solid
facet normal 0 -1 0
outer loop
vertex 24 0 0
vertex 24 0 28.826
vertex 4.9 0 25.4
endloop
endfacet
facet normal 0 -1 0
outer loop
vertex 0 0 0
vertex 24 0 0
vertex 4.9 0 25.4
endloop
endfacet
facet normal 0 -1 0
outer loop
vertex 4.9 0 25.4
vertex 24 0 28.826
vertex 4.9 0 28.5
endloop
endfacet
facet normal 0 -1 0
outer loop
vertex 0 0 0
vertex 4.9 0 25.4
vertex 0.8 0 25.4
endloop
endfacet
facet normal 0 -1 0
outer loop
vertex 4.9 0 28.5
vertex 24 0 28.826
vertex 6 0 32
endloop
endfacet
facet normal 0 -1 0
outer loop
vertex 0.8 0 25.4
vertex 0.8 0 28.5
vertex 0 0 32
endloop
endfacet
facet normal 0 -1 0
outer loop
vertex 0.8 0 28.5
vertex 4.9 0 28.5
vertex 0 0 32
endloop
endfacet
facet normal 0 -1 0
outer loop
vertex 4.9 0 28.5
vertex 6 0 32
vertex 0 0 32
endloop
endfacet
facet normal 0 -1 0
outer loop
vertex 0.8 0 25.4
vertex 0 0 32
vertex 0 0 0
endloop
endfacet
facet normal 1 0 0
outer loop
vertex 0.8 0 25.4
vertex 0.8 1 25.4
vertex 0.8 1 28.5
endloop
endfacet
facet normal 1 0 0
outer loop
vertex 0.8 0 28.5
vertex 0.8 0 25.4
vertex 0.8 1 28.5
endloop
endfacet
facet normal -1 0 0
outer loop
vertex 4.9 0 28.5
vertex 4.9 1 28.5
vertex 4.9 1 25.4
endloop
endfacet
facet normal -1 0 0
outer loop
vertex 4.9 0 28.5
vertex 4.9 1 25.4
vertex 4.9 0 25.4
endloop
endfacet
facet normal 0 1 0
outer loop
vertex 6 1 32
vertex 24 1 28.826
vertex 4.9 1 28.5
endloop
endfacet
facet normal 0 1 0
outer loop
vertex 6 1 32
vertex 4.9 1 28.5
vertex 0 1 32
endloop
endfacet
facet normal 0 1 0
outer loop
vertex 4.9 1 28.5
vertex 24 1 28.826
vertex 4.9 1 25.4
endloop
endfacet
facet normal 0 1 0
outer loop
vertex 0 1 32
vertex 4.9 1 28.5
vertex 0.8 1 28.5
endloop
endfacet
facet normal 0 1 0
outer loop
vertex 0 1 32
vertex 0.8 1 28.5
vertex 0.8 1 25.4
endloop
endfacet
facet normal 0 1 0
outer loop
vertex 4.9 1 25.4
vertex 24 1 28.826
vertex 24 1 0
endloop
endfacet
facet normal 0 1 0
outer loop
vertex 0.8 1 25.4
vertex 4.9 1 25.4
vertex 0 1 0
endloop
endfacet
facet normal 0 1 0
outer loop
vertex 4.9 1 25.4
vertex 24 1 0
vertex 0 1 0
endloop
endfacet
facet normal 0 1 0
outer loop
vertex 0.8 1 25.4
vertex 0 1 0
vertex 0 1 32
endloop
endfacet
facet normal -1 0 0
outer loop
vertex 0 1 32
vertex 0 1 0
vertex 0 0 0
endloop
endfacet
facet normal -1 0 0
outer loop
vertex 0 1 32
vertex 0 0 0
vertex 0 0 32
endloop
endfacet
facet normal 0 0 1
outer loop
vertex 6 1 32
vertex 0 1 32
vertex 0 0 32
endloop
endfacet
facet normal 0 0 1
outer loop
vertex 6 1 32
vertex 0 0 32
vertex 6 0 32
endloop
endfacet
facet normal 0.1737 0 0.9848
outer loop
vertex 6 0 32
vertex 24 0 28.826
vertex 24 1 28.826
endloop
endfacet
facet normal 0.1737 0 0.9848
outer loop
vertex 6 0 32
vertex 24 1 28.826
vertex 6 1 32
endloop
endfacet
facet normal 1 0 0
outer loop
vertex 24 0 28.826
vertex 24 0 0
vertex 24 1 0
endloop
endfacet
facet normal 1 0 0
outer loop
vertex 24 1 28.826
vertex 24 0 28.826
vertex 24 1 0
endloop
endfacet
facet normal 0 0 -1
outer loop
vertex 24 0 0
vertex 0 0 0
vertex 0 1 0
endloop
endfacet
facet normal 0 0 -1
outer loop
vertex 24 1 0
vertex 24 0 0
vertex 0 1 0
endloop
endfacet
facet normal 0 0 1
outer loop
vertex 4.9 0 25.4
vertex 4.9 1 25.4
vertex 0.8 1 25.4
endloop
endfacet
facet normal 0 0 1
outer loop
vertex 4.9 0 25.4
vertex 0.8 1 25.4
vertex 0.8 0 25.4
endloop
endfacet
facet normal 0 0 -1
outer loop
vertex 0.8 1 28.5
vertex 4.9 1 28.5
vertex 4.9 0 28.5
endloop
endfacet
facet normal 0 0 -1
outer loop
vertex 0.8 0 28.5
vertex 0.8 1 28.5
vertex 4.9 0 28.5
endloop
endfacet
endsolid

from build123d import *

# Parameters (mm, degrees)
SKETCH_3_W          = 2.5
SKETCH_3_H          = 24
EXTRUDE_1_DEPTH     = 33
FILLET_1_R          = 1
CUT_EXTRUDE_1_DEPTH = 41.880924647
SKETCH_5_W          = 2.5
SKETCH_5_H          = 3.1
CUT_EXTRUDE_2_DEPTH = 4.9
SKETCH_6_W          = 24
SKETCH_6_H          = 2.5
CUT_EXTRUDE_3_DEPTH = 1
CUT_EXTRUDE_4_DEPTH = 41.078048855
SKETCH_8_W          = 0.8
SKETCH_8_H          = 3.1
EXTRUDE_2_DEPTH     = 2.5
SKETCH_10_W         = 4.1
SKETCH_10_H         = 3.1
CUT_EXTRUDE_5_DEPTH = 41.028115119


with BuildPart() as part:
    # 草图3 → 凸台-拉伸1 (new body)
    with BuildSketch(Plane(origin=(0, 0, 0), x_dir=(0, 1, 0), z_dir=(0, 0, 1))):
        with Locations((1.25, -12)):
            Rectangle(SKETCH_3_W, SKETCH_3_H)
    extrude(amount=EXTRUDE_1_DEPTH)

    # 圆角1
    fillet_1_edges = [part.edges().sort_by_distance(p)[0] for p in [
        (24, 2.5, 16.5),
    ]]
    fillet(fillet_1_edges, radius=FILLET_1_R)

    # 草图4 → 切除-拉伸1 (cut, through all)
    with BuildSketch(Plane.XZ):
        Polygon((3, 33), (24, 31.162738066), (24, 33), align=None)
    extrude(amount=-CUT_EXTRUDE_1_DEPTH, mode=Mode.SUBTRACT)

    # 草图5 → 切除-拉伸2 (cut)
    with BuildSketch(Plane(origin=(0, 0, 0), x_dir=(0, -1, 0), z_dir=(-1, 0, 0))):
        with Locations((-1.25, 26.95)):
            Rectangle(SKETCH_5_W, SKETCH_5_H)
    extrude(amount=-CUT_EXTRUDE_2_DEPTH, mode=Mode.SUBTRACT)

    # 草图6 → 切除-拉伸3 (cut)
    with BuildSketch(Plane.XY.offset(33)):
        with Locations((12, 1.25)):
            Rectangle(SKETCH_6_W, SKETCH_6_H)
    extrude(amount=-CUT_EXTRUDE_3_DEPTH, mode=Mode.SUBTRACT)

    # 草图7 → 切除-拉伸4 (cut, through all)
    with BuildSketch(Plane.XZ):
        Polygon((24, 31.162738066), (24, 28.826114347), (6, 32), (14.430052303, 32), align=None)
    extrude(amount=-CUT_EXTRUDE_4_DEPTH, mode=Mode.SUBTRACT)

    # 草图8 → 凸台-拉伸2 (add)
    with BuildSketch(Plane(origin=(0, 2.5, 0), x_dir=(-1, 0, 0), z_dir=(0, 1, 0))):
        with Locations((-0.4, 26.95)):
            Rectangle(SKETCH_8_W, SKETCH_8_H)
    extrude(amount=-EXTRUDE_2_DEPTH)

    # 草图10 → 切除-拉伸5 (cut, through all)
    with BuildSketch(Plane(origin=(0, 1, 0), x_dir=(-1, 0, 0), z_dir=(0, -1, 0))):
        Polygon((-6, -32), (0, -32), (0, 0), (-24, 0), (-24, -28.826114347), align=None)
        with Locations((-2.85, -26.95)):
            Rectangle(SKETCH_10_W, SKETCH_10_H, mode=Mode.SUBTRACT)
    extrude(amount=-CUT_EXTRUDE_5_DEPTH, mode=Mode.SUBTRACT)


solid = part.part
